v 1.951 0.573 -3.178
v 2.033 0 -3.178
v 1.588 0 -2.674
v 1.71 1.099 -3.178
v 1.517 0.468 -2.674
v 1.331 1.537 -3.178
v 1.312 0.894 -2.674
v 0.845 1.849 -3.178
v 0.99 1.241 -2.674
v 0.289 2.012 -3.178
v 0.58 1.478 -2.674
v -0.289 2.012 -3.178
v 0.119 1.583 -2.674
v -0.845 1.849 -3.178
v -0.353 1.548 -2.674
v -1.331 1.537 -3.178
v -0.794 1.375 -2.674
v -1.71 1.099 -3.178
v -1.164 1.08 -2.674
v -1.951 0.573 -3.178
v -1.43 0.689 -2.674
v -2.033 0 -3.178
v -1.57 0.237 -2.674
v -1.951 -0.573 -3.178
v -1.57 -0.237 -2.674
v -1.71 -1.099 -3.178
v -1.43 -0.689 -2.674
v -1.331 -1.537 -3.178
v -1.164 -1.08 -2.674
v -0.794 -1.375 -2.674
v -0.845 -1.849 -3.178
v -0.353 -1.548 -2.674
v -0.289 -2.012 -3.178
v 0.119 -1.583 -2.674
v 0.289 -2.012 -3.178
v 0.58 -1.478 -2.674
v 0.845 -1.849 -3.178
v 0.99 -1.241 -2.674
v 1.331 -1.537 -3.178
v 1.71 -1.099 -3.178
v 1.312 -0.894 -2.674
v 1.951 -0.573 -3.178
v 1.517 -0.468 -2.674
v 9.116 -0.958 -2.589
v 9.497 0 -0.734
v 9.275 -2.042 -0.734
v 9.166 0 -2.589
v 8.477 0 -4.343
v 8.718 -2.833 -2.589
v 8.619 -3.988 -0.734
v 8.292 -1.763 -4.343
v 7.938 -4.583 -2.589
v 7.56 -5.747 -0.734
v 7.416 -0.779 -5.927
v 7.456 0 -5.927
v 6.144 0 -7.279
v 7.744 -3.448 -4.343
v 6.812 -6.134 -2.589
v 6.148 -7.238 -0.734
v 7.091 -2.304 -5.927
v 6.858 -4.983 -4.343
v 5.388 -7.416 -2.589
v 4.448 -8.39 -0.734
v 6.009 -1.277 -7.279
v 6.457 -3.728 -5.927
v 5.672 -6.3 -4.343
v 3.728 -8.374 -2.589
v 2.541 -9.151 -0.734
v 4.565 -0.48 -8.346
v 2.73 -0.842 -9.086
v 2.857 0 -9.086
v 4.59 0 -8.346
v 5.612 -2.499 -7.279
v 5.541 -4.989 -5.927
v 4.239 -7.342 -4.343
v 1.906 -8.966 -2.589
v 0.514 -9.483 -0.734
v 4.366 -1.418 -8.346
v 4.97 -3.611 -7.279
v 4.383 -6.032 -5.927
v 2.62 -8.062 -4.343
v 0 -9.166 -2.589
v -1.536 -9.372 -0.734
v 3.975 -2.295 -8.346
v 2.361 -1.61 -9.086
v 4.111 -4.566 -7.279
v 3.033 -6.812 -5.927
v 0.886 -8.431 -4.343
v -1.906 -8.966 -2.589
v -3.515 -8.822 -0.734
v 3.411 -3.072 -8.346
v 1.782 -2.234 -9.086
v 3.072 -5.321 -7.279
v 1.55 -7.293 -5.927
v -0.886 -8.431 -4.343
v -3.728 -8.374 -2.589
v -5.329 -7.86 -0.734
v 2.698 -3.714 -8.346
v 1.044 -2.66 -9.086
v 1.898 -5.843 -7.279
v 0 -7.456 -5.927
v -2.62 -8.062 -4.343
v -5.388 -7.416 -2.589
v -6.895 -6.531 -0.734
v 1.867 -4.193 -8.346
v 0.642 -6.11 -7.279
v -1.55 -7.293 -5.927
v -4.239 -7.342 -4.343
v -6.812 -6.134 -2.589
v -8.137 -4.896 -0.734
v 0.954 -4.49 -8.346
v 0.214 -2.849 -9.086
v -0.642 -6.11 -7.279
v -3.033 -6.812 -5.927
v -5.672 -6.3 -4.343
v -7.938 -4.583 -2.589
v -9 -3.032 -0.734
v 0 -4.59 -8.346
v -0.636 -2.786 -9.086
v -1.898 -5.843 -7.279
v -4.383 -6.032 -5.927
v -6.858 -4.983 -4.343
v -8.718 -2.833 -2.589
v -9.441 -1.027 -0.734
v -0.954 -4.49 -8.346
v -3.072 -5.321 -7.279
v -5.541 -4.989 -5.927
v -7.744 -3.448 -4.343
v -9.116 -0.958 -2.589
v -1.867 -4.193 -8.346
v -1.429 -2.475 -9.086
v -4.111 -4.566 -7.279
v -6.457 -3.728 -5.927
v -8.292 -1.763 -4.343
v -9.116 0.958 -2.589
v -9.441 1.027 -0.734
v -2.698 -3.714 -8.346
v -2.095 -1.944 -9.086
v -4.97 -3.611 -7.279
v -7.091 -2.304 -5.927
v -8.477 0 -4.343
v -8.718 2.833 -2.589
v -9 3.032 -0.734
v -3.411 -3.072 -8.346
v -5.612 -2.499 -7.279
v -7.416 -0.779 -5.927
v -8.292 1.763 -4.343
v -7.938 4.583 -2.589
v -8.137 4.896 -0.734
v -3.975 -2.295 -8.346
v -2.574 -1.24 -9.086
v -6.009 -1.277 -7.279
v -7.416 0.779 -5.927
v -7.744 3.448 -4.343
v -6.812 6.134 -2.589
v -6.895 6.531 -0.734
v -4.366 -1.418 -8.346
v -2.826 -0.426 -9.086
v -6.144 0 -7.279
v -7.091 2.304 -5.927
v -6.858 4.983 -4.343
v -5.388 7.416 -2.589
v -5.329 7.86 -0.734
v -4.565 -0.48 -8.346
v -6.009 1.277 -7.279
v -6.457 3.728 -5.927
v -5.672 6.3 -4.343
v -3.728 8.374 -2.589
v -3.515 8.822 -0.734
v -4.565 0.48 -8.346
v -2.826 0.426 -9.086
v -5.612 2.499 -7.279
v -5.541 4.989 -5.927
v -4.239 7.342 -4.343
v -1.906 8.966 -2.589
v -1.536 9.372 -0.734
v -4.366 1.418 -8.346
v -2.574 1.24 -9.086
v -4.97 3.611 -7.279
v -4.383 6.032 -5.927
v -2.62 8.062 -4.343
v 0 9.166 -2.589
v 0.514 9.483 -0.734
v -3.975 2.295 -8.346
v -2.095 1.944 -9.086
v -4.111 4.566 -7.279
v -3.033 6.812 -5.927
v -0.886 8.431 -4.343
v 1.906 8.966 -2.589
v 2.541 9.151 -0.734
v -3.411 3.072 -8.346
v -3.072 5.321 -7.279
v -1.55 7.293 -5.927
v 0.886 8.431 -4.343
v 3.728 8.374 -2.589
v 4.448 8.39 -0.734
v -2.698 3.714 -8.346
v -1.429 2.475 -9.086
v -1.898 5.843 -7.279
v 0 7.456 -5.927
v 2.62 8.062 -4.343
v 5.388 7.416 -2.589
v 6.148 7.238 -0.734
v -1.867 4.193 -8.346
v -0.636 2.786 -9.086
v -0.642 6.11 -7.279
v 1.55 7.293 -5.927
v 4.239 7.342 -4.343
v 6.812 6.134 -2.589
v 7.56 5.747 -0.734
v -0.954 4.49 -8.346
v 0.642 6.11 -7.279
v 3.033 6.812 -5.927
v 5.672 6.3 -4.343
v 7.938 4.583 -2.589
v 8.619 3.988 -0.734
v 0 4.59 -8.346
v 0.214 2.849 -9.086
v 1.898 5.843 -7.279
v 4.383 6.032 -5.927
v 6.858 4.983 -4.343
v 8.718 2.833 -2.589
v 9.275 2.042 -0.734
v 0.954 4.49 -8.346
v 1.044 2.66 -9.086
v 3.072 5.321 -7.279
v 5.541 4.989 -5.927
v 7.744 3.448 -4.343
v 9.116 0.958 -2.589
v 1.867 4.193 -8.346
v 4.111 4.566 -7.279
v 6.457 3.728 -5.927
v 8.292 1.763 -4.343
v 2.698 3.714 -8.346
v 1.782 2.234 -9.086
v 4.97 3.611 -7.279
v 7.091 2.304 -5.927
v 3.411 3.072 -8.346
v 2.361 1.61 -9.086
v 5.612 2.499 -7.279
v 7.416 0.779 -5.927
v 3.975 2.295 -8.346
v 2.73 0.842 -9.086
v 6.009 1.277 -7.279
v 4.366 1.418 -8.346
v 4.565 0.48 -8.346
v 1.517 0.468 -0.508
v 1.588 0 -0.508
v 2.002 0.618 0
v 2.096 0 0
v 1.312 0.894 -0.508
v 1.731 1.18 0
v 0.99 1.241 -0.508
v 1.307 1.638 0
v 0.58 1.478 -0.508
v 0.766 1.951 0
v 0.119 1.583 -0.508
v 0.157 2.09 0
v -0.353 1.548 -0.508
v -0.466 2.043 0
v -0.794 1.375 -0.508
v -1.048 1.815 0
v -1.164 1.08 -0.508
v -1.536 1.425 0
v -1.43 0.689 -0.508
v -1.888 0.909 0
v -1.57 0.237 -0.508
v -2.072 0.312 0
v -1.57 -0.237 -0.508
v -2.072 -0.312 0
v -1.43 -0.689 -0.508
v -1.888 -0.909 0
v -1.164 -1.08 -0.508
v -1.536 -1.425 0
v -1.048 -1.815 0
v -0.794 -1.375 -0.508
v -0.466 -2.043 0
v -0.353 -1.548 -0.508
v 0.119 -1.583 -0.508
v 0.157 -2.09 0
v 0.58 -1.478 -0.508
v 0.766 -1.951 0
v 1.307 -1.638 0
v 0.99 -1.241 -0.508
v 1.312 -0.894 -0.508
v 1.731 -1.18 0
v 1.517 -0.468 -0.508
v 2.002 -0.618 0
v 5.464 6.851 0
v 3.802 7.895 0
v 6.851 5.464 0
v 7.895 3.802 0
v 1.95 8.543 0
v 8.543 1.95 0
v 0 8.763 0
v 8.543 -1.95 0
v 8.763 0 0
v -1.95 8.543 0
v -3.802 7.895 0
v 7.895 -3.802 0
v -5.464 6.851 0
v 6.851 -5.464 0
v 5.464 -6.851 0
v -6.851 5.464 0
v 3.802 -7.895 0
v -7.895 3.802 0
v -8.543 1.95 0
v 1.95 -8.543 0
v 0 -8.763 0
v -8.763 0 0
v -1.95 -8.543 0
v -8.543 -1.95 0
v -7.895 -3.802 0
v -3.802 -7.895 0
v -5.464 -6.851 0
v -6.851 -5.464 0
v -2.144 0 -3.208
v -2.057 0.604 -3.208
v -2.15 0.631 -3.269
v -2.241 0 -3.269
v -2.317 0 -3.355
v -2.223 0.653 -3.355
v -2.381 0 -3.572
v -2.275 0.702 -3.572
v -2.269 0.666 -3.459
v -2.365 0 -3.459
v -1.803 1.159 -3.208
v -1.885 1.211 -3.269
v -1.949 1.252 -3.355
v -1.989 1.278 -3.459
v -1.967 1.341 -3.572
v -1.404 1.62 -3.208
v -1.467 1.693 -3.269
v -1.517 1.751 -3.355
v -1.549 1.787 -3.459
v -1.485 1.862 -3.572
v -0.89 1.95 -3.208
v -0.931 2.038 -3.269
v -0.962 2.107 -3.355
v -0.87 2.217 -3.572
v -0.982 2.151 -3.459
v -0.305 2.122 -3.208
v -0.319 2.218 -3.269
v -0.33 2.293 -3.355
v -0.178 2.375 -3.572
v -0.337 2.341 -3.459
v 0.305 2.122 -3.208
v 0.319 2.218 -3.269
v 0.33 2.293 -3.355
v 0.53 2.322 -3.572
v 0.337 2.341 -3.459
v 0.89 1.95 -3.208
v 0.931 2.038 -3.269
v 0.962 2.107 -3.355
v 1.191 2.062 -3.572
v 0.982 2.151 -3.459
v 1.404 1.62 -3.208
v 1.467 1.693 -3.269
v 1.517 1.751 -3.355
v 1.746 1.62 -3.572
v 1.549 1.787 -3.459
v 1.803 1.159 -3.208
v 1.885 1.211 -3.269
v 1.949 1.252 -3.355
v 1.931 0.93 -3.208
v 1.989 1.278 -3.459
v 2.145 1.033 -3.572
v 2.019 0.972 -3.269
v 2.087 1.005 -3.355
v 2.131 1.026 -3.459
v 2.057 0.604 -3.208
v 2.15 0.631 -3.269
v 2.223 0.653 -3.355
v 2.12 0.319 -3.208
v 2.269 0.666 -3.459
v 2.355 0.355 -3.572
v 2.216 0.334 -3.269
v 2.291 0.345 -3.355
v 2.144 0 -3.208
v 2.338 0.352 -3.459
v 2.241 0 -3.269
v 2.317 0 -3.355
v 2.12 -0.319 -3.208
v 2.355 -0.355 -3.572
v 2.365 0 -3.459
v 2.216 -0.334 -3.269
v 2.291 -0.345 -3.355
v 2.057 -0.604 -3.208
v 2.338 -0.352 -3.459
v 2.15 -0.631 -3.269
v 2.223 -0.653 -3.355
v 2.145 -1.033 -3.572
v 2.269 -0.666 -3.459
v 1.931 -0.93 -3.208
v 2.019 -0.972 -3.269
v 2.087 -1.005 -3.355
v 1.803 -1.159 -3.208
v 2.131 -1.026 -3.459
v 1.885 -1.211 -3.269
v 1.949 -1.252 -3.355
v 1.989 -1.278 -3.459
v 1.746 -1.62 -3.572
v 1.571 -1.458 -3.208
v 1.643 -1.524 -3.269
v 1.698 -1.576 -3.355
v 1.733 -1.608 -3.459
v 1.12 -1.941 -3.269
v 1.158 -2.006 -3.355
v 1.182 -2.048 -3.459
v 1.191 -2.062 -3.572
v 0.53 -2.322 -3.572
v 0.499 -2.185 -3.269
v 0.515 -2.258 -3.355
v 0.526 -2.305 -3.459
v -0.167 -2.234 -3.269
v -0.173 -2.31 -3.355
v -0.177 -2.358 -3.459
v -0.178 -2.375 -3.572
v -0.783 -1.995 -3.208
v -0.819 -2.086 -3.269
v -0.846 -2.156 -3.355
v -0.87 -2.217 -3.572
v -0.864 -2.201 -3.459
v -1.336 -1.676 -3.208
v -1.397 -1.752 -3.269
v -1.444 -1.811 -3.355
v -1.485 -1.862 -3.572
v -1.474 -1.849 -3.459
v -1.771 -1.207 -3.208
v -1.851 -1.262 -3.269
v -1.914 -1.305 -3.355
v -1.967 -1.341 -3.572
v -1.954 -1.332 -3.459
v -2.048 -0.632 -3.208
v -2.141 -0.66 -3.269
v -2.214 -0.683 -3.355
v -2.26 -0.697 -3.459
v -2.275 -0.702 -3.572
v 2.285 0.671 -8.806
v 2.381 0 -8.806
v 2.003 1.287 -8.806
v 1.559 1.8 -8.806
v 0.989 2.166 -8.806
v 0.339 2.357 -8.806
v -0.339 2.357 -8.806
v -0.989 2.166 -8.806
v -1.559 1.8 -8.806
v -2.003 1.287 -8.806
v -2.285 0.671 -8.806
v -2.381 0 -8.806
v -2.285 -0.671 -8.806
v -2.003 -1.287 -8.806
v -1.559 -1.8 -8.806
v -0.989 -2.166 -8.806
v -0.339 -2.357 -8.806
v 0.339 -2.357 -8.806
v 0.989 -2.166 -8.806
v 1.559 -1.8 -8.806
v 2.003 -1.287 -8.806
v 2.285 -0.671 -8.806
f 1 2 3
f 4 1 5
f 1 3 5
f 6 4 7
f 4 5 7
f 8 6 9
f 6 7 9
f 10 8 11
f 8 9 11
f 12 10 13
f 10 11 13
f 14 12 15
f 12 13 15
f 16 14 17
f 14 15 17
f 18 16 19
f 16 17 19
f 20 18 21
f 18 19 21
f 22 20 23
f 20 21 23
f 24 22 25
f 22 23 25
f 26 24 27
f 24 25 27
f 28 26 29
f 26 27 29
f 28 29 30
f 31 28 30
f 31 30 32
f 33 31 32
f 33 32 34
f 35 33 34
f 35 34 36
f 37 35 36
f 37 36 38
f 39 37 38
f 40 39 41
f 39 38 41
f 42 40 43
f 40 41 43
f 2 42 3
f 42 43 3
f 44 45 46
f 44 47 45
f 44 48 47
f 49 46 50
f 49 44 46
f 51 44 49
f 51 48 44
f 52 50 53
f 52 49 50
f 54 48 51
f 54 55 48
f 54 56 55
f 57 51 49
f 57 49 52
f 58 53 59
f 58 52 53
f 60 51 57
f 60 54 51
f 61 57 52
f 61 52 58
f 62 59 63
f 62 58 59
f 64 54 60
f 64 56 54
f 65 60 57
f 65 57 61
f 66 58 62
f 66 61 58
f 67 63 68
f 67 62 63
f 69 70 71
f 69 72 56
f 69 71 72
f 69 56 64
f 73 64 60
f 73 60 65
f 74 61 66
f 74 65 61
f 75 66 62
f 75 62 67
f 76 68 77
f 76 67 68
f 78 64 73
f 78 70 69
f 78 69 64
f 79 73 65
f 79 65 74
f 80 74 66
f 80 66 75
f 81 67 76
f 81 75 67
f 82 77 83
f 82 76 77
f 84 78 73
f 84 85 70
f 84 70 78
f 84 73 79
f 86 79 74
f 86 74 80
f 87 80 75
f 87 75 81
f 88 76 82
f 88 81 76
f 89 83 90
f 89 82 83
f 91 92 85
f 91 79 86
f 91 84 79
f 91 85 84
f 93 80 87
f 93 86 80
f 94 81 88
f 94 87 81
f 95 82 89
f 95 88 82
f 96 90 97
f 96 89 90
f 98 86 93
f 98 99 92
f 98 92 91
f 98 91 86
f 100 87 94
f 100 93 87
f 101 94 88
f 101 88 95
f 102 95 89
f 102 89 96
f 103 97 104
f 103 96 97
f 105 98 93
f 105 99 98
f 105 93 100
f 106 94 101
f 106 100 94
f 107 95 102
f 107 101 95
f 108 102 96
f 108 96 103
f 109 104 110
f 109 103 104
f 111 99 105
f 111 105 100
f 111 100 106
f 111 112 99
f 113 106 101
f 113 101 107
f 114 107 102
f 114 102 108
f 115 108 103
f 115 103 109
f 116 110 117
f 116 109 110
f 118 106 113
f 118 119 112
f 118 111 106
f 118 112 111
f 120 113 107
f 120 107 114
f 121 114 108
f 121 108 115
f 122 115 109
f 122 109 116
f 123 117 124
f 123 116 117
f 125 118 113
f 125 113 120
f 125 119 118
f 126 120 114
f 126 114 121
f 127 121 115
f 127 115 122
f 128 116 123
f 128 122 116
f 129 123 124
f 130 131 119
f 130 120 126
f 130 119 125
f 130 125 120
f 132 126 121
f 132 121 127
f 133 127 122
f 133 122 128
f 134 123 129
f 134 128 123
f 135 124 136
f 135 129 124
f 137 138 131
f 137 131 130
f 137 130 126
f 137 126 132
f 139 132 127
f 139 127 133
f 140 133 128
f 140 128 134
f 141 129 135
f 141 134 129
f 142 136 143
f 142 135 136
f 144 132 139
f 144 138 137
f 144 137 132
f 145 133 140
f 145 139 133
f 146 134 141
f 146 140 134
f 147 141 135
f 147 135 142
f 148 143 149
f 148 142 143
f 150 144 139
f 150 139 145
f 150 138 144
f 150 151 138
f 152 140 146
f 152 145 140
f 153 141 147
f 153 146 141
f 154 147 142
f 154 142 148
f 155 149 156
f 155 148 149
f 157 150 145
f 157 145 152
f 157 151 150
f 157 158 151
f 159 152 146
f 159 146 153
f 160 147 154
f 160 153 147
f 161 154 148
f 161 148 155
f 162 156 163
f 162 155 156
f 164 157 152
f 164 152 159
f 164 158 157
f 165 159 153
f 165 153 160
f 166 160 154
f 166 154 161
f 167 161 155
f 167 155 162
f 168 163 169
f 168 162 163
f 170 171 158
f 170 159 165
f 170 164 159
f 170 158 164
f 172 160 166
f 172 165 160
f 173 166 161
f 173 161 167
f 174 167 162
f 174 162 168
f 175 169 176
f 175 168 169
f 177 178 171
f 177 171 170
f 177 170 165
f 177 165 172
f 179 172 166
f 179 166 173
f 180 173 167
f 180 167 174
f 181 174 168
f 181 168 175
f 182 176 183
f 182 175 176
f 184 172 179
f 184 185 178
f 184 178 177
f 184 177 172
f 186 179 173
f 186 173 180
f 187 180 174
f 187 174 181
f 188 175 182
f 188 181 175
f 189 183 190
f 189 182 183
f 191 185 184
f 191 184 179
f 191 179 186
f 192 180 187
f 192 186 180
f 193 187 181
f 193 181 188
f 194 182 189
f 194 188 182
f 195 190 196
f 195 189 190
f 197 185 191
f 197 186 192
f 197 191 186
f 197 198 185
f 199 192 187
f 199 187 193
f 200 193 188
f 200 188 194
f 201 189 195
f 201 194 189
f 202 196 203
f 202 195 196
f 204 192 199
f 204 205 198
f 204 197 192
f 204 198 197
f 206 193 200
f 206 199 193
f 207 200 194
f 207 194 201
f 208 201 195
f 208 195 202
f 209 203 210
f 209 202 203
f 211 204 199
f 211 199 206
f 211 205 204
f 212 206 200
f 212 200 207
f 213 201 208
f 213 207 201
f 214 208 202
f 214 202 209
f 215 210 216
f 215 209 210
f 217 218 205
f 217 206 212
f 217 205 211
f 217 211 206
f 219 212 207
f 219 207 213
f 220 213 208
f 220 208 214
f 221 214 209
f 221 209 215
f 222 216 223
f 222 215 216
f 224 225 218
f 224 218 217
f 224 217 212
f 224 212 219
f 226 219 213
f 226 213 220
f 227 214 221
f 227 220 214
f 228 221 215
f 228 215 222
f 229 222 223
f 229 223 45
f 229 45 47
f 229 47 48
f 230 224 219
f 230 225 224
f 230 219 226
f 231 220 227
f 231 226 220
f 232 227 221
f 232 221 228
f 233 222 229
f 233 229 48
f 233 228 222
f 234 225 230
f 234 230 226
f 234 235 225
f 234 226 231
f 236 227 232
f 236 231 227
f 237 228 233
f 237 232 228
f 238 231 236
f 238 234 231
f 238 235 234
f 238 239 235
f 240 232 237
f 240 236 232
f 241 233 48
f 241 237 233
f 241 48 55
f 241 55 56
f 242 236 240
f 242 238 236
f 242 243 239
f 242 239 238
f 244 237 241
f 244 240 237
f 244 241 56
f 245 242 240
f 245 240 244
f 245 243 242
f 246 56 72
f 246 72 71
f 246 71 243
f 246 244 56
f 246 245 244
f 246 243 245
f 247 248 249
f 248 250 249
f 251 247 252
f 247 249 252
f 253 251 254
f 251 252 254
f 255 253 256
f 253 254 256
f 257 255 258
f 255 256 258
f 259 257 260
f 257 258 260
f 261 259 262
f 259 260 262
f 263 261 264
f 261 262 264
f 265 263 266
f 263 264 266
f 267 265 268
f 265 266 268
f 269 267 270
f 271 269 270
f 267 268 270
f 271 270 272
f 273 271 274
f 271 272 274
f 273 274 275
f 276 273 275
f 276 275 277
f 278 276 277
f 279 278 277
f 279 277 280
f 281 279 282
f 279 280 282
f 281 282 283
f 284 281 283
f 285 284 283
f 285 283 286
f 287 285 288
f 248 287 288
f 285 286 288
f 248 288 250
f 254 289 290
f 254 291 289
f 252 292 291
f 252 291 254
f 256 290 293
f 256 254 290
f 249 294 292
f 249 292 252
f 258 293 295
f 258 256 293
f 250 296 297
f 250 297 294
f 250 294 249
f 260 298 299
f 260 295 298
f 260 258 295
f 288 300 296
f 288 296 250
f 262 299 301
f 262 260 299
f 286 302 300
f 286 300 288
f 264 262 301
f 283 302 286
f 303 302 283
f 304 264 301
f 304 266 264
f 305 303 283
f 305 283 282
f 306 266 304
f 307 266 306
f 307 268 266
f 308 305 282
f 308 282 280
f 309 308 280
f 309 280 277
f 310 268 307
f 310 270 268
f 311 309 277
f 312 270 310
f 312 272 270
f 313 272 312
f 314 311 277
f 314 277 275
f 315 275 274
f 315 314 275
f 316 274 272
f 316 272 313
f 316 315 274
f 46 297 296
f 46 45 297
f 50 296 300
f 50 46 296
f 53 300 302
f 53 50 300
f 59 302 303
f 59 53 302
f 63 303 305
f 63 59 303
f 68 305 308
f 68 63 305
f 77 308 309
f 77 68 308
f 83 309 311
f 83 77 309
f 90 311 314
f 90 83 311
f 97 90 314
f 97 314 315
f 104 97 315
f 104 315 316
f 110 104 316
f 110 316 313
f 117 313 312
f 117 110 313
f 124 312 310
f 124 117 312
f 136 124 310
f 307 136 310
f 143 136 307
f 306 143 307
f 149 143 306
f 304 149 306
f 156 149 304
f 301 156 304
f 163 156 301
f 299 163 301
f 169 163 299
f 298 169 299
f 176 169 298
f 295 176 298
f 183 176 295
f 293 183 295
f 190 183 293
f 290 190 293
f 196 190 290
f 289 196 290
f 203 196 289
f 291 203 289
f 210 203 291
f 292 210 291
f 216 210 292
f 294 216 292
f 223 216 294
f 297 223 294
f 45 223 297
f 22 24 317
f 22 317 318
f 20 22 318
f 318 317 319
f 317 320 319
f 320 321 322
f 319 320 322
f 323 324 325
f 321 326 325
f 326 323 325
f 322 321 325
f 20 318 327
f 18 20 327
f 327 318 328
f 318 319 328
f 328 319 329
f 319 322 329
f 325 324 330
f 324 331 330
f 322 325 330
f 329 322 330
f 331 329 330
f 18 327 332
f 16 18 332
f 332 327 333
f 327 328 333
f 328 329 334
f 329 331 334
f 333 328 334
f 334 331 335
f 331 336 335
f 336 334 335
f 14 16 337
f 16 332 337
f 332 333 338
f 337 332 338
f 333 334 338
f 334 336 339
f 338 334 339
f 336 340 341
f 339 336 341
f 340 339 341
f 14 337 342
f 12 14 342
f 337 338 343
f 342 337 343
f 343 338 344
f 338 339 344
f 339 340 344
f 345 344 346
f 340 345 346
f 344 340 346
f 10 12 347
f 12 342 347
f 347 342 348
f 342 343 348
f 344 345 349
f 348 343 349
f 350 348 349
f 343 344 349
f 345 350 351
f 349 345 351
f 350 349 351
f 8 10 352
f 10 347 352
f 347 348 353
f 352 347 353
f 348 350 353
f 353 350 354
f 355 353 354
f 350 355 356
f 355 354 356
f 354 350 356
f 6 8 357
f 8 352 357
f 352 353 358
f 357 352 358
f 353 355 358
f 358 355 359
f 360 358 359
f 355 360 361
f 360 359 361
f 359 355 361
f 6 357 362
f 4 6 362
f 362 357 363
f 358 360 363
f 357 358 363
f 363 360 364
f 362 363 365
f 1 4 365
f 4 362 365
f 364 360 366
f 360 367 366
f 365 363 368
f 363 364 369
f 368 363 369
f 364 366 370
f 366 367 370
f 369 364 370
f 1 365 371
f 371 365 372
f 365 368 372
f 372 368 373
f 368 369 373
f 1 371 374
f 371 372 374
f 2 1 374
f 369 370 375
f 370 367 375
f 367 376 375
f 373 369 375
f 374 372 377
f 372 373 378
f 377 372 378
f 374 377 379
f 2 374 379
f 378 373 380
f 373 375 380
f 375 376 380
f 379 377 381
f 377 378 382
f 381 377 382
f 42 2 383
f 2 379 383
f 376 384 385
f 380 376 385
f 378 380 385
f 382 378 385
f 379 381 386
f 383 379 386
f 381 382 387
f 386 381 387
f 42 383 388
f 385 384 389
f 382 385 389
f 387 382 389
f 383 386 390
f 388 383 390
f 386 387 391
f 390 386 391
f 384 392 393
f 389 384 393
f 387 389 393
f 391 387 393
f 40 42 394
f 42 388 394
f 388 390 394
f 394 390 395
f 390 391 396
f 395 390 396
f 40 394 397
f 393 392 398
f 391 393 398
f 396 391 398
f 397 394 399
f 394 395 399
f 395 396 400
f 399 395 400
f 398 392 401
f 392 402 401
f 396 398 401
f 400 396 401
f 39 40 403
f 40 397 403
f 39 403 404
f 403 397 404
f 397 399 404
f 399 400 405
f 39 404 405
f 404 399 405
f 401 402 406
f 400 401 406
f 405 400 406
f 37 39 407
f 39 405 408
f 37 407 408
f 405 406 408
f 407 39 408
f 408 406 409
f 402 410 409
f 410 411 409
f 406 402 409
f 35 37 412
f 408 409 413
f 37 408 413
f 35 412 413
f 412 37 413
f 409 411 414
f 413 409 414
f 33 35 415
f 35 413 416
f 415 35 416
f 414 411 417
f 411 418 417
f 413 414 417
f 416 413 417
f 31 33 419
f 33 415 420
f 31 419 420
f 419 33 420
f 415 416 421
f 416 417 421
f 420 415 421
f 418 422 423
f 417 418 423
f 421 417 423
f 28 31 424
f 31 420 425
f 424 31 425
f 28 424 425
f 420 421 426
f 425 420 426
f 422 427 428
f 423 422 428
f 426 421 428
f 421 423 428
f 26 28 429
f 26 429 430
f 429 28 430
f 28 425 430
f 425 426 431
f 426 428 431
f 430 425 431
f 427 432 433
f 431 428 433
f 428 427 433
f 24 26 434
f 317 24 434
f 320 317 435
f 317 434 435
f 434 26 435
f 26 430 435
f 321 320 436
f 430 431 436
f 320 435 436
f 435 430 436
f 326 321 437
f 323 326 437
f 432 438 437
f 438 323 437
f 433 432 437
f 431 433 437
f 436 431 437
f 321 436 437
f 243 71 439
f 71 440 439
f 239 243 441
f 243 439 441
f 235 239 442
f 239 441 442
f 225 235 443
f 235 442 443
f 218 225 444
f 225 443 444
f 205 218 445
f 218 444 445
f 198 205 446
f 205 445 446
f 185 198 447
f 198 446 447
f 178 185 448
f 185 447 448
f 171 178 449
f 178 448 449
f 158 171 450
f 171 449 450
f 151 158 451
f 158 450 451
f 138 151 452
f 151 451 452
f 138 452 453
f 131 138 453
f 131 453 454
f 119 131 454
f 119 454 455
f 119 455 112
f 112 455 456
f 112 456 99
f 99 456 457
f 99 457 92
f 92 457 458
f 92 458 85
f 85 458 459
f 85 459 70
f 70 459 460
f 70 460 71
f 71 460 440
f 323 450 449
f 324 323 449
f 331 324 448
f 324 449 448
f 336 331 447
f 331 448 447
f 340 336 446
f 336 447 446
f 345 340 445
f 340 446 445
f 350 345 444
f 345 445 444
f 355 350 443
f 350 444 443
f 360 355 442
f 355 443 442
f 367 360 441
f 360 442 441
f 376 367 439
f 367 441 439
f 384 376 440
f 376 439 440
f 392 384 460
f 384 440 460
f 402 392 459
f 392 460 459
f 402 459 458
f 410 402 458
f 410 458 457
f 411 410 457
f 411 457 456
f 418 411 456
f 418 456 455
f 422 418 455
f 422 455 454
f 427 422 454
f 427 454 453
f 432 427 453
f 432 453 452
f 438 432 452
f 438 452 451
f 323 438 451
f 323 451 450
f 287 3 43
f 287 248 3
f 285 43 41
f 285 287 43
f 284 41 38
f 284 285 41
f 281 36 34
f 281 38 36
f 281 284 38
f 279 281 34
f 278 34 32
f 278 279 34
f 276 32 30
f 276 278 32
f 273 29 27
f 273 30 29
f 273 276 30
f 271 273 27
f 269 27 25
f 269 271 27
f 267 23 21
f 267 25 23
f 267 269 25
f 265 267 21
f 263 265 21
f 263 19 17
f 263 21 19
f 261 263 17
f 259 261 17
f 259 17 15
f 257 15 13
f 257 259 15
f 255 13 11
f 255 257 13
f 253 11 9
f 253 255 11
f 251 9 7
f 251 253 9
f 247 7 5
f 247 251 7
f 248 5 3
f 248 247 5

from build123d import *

# Parameters (mm, degrees)
SKETCH4_R          = 2.38125
CUT_EXTRUDE2_DEPTH = 6.35
FILLET1_R          = 0.396875
CHAMFER1_SIZE      = 0.762


with BuildPart() as part:
    # Sketch1 → Revolve1 (revolve)
    with BuildSketch(Plane(origin=(0, 0, 0), x_dir=(1, 0, 0), z_dir=(0, 1, 0))):
        with BuildLine():
            Line((1.5875, 0), (9.525, 0))
            ThreePointArc((9.525, 0), (7.274838916, 6.148361062), (1.5875, 9.391776656))
            Line((1.5875, 9.391776656), (1.5875, 0))
        make_face()
    revolve(axis=Axis((0, 0, 0), (0, 0, -1)))

    # Sketch4 → Cut-Extrude2 (cut)
    with BuildSketch(Plane(origin=(0, 0, -9.525), x_dir=(-1, 0, 0), z_dir=(0, 0, -1))):
        Circle(SKETCH4_R)
    extrude(amount=-CUT_EXTRUDE2_DEPTH, mode=Mode.SUBTRACT)

    # Fillet1
    fillet1_edges = [part.edges().sort_by_distance(p)[0] for p in [
        (2.38125, 0, -3.175),
    ]]
    fillet(fillet1_edges, radius=FILLET1_R)

    # Chamfer1
    # the kernel refuses this chamfer: 0.762 mm, written as the material it takes off along each edge
    with BuildSketch(Plane(origin=(0, 0, 0), x_dir=(1, 0, 0), z_dir=(0, 1, 0))) as chamfer1_piece_1:
        with BuildLine():
            Line((9.525 - CHAMFER1_SIZE, 0), (9.496699923, 0.733699923))
            ThreePointArc((9.496699923, 0.733699923), (9.517517871, 0.37746333), (9.525, 0))
            Line((9.525, 0), (9.525 - CHAMFER1_SIZE, 0))
        make_face()
    revolve(axis=Axis((0, 0, 0), (0, 0, -1)), mode=Mode.SUBTRACT)

    # Chamfer2: read off the stored shape, not the designer's step
    # Chamfer2 outline → Chamfer2 (revolve, cut)
    with BuildSketch(Plane.XZ):
        Polygon((2.033114035, -3.178004117), (1.5875, -2.673849388), (1.5875, -3.178004117), align=None)
        Polygon((1.5875, 0), (1.5875, -0.508), (2.0955, 0), align=None)
        Polygon((2.857431183, -9.086292535), (2.38125, -8.805548582), (2.38125, -9.086292535), align=None)
    revolve(axis=Axis((0, 0, 0), (0, 0, 1)), mode=Mode.SUBTRACT)

    # Chamfer2 2 outline → Chamfer2 2 (revolve, cut)
    with BuildSketch(Plane.XZ):
        with BuildLine():
            Line((2.857431193, -9.086292532), (2.38125, -9.086292535))
            Line((2.38125, -9.086292535), (2.381249991, -9.222541596))
            ThreePointArc((2.381249991, -9.222541596), (2.620226343, -9.157512703), (2.857431193, -9.086292532))
        make_face()
    revolve(axis=Axis((0, 0, 0), (0, 0, 1)), mode=Mode.SUBTRACT)


solid = part.part
